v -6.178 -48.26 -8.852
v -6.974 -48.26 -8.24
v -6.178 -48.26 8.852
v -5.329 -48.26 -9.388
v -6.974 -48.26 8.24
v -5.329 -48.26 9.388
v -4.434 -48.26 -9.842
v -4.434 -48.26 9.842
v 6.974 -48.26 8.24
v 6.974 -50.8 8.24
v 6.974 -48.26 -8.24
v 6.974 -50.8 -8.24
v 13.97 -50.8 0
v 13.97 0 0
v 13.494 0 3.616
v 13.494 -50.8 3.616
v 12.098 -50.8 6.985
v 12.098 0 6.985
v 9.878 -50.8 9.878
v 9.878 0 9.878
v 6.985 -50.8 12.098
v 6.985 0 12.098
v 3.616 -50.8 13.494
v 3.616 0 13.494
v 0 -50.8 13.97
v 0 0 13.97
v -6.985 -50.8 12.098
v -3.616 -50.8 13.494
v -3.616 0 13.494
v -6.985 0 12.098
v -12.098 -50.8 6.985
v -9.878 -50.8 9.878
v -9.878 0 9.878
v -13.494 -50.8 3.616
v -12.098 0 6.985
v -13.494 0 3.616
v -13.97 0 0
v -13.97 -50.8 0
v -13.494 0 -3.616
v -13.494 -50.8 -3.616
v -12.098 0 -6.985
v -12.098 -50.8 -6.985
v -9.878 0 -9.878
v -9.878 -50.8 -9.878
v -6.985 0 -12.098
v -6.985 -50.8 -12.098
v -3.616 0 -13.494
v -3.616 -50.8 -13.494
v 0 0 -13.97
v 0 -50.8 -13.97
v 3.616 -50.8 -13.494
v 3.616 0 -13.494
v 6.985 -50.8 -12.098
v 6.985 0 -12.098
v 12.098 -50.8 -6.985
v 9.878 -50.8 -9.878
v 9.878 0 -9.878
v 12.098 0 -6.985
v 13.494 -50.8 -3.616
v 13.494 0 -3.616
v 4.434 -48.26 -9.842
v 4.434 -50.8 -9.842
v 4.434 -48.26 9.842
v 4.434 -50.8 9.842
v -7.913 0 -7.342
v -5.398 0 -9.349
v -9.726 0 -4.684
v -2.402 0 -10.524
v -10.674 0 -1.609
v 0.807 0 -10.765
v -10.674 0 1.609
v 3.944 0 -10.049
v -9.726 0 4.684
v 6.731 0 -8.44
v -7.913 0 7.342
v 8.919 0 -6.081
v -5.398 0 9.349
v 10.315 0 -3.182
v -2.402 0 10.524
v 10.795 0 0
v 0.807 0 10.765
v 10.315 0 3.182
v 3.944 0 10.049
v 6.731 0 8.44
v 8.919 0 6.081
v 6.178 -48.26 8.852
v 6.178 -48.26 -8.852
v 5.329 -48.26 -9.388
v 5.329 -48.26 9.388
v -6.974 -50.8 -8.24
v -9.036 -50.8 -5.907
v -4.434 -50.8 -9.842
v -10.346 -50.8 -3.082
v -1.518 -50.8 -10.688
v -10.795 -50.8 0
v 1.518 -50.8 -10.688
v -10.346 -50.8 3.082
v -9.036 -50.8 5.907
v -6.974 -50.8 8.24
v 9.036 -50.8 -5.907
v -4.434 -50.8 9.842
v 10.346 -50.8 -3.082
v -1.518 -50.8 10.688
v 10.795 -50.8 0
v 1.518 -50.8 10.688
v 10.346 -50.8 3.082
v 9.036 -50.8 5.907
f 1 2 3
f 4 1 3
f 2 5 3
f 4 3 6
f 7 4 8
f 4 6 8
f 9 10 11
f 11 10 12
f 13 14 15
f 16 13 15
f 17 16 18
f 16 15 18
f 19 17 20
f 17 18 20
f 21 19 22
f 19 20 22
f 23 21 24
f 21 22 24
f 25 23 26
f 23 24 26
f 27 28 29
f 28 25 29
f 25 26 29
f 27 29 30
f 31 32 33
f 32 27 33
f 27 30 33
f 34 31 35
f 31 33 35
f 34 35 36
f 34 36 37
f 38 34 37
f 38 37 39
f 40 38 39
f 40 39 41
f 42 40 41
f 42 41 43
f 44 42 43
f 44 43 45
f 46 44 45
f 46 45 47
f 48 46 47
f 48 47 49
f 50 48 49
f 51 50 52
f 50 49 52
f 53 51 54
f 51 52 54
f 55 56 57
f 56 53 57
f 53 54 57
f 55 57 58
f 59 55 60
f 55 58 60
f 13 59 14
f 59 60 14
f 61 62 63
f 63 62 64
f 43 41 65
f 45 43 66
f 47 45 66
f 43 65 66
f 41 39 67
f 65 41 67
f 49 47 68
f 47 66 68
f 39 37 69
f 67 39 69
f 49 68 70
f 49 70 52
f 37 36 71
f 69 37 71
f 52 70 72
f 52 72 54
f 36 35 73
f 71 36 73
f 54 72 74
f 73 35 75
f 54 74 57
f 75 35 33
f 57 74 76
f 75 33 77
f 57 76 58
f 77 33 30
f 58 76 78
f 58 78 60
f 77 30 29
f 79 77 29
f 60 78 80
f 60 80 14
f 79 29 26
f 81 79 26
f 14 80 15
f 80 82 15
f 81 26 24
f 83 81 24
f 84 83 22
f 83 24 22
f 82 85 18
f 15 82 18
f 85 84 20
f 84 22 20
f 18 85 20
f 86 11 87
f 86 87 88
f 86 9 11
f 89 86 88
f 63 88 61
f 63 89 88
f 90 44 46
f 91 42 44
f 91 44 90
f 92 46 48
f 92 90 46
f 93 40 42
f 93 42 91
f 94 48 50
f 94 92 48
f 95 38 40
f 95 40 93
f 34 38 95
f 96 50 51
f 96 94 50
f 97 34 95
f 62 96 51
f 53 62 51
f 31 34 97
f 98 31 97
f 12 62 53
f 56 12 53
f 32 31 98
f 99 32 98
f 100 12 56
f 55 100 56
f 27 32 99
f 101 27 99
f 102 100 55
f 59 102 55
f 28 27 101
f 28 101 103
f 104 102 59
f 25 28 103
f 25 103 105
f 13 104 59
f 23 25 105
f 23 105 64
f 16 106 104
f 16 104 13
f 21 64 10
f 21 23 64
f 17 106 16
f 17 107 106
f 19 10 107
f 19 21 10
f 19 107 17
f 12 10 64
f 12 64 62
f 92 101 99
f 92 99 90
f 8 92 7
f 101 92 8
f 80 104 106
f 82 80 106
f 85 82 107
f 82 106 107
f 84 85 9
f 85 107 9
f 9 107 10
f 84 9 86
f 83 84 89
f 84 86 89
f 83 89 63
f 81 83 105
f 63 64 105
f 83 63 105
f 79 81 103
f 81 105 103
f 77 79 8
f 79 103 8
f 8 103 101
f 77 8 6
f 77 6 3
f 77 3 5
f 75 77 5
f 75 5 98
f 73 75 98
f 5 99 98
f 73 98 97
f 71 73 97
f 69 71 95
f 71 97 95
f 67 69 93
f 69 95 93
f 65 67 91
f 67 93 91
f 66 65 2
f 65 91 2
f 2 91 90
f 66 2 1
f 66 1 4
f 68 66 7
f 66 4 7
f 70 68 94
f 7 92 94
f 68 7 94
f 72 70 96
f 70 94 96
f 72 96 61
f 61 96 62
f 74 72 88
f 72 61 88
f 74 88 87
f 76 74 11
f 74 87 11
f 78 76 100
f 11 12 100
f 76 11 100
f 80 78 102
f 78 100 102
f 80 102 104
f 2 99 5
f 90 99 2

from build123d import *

# Parameters (mm, degrees)
F0_R     = 13.97
F1_DEPTH = 50.8
F2_R     = 10.795
F3_DEPTH = 50.8
F5_DEPTH = 2.54


with BuildPart() as f1:
    # F0 (on Front) → F1 (new body)
    with BuildSketch(Plane.XZ):
        Circle(F0_R)
    extrude(amount=F1_DEPTH)

    # F2 (on face) → F3 (cut)
    with BuildSketch(Plane.XZ.offset(50.8)):
        Circle(F2_R)
    extrude(amount=-F3_DEPTH, mode=Mode.SUBTRACT)

    # F4 (on face) → F5 (join)
    with BuildSketch(Plane.XZ.offset(50.8)):
        with BuildLine():
            ThreePointArc((-6.973512343, -8.2402761242), (-5.7595656887, -9.1301384479), (-4.4336462139, -9.8425))
            Line((-4.4336462139, -9.8425), (-4.4336462139, 9.8425))
            ThreePointArc((-4.4336462139, 9.8425), (-5.7595656887, 9.1301384479), (-6.973512343, 8.2402761242))
            Line((-6.973512343, 8.2402761242), (-6.973512343, -8.2402761242))
        make_face()
    extrude(amount=-F5_DEPTH)

    # F6: F1 across plane


with BuildPart() as f1_1:
    add(f1.part)
    add(f1.part.mirror(Plane.YZ))


solid = f1_1.part
